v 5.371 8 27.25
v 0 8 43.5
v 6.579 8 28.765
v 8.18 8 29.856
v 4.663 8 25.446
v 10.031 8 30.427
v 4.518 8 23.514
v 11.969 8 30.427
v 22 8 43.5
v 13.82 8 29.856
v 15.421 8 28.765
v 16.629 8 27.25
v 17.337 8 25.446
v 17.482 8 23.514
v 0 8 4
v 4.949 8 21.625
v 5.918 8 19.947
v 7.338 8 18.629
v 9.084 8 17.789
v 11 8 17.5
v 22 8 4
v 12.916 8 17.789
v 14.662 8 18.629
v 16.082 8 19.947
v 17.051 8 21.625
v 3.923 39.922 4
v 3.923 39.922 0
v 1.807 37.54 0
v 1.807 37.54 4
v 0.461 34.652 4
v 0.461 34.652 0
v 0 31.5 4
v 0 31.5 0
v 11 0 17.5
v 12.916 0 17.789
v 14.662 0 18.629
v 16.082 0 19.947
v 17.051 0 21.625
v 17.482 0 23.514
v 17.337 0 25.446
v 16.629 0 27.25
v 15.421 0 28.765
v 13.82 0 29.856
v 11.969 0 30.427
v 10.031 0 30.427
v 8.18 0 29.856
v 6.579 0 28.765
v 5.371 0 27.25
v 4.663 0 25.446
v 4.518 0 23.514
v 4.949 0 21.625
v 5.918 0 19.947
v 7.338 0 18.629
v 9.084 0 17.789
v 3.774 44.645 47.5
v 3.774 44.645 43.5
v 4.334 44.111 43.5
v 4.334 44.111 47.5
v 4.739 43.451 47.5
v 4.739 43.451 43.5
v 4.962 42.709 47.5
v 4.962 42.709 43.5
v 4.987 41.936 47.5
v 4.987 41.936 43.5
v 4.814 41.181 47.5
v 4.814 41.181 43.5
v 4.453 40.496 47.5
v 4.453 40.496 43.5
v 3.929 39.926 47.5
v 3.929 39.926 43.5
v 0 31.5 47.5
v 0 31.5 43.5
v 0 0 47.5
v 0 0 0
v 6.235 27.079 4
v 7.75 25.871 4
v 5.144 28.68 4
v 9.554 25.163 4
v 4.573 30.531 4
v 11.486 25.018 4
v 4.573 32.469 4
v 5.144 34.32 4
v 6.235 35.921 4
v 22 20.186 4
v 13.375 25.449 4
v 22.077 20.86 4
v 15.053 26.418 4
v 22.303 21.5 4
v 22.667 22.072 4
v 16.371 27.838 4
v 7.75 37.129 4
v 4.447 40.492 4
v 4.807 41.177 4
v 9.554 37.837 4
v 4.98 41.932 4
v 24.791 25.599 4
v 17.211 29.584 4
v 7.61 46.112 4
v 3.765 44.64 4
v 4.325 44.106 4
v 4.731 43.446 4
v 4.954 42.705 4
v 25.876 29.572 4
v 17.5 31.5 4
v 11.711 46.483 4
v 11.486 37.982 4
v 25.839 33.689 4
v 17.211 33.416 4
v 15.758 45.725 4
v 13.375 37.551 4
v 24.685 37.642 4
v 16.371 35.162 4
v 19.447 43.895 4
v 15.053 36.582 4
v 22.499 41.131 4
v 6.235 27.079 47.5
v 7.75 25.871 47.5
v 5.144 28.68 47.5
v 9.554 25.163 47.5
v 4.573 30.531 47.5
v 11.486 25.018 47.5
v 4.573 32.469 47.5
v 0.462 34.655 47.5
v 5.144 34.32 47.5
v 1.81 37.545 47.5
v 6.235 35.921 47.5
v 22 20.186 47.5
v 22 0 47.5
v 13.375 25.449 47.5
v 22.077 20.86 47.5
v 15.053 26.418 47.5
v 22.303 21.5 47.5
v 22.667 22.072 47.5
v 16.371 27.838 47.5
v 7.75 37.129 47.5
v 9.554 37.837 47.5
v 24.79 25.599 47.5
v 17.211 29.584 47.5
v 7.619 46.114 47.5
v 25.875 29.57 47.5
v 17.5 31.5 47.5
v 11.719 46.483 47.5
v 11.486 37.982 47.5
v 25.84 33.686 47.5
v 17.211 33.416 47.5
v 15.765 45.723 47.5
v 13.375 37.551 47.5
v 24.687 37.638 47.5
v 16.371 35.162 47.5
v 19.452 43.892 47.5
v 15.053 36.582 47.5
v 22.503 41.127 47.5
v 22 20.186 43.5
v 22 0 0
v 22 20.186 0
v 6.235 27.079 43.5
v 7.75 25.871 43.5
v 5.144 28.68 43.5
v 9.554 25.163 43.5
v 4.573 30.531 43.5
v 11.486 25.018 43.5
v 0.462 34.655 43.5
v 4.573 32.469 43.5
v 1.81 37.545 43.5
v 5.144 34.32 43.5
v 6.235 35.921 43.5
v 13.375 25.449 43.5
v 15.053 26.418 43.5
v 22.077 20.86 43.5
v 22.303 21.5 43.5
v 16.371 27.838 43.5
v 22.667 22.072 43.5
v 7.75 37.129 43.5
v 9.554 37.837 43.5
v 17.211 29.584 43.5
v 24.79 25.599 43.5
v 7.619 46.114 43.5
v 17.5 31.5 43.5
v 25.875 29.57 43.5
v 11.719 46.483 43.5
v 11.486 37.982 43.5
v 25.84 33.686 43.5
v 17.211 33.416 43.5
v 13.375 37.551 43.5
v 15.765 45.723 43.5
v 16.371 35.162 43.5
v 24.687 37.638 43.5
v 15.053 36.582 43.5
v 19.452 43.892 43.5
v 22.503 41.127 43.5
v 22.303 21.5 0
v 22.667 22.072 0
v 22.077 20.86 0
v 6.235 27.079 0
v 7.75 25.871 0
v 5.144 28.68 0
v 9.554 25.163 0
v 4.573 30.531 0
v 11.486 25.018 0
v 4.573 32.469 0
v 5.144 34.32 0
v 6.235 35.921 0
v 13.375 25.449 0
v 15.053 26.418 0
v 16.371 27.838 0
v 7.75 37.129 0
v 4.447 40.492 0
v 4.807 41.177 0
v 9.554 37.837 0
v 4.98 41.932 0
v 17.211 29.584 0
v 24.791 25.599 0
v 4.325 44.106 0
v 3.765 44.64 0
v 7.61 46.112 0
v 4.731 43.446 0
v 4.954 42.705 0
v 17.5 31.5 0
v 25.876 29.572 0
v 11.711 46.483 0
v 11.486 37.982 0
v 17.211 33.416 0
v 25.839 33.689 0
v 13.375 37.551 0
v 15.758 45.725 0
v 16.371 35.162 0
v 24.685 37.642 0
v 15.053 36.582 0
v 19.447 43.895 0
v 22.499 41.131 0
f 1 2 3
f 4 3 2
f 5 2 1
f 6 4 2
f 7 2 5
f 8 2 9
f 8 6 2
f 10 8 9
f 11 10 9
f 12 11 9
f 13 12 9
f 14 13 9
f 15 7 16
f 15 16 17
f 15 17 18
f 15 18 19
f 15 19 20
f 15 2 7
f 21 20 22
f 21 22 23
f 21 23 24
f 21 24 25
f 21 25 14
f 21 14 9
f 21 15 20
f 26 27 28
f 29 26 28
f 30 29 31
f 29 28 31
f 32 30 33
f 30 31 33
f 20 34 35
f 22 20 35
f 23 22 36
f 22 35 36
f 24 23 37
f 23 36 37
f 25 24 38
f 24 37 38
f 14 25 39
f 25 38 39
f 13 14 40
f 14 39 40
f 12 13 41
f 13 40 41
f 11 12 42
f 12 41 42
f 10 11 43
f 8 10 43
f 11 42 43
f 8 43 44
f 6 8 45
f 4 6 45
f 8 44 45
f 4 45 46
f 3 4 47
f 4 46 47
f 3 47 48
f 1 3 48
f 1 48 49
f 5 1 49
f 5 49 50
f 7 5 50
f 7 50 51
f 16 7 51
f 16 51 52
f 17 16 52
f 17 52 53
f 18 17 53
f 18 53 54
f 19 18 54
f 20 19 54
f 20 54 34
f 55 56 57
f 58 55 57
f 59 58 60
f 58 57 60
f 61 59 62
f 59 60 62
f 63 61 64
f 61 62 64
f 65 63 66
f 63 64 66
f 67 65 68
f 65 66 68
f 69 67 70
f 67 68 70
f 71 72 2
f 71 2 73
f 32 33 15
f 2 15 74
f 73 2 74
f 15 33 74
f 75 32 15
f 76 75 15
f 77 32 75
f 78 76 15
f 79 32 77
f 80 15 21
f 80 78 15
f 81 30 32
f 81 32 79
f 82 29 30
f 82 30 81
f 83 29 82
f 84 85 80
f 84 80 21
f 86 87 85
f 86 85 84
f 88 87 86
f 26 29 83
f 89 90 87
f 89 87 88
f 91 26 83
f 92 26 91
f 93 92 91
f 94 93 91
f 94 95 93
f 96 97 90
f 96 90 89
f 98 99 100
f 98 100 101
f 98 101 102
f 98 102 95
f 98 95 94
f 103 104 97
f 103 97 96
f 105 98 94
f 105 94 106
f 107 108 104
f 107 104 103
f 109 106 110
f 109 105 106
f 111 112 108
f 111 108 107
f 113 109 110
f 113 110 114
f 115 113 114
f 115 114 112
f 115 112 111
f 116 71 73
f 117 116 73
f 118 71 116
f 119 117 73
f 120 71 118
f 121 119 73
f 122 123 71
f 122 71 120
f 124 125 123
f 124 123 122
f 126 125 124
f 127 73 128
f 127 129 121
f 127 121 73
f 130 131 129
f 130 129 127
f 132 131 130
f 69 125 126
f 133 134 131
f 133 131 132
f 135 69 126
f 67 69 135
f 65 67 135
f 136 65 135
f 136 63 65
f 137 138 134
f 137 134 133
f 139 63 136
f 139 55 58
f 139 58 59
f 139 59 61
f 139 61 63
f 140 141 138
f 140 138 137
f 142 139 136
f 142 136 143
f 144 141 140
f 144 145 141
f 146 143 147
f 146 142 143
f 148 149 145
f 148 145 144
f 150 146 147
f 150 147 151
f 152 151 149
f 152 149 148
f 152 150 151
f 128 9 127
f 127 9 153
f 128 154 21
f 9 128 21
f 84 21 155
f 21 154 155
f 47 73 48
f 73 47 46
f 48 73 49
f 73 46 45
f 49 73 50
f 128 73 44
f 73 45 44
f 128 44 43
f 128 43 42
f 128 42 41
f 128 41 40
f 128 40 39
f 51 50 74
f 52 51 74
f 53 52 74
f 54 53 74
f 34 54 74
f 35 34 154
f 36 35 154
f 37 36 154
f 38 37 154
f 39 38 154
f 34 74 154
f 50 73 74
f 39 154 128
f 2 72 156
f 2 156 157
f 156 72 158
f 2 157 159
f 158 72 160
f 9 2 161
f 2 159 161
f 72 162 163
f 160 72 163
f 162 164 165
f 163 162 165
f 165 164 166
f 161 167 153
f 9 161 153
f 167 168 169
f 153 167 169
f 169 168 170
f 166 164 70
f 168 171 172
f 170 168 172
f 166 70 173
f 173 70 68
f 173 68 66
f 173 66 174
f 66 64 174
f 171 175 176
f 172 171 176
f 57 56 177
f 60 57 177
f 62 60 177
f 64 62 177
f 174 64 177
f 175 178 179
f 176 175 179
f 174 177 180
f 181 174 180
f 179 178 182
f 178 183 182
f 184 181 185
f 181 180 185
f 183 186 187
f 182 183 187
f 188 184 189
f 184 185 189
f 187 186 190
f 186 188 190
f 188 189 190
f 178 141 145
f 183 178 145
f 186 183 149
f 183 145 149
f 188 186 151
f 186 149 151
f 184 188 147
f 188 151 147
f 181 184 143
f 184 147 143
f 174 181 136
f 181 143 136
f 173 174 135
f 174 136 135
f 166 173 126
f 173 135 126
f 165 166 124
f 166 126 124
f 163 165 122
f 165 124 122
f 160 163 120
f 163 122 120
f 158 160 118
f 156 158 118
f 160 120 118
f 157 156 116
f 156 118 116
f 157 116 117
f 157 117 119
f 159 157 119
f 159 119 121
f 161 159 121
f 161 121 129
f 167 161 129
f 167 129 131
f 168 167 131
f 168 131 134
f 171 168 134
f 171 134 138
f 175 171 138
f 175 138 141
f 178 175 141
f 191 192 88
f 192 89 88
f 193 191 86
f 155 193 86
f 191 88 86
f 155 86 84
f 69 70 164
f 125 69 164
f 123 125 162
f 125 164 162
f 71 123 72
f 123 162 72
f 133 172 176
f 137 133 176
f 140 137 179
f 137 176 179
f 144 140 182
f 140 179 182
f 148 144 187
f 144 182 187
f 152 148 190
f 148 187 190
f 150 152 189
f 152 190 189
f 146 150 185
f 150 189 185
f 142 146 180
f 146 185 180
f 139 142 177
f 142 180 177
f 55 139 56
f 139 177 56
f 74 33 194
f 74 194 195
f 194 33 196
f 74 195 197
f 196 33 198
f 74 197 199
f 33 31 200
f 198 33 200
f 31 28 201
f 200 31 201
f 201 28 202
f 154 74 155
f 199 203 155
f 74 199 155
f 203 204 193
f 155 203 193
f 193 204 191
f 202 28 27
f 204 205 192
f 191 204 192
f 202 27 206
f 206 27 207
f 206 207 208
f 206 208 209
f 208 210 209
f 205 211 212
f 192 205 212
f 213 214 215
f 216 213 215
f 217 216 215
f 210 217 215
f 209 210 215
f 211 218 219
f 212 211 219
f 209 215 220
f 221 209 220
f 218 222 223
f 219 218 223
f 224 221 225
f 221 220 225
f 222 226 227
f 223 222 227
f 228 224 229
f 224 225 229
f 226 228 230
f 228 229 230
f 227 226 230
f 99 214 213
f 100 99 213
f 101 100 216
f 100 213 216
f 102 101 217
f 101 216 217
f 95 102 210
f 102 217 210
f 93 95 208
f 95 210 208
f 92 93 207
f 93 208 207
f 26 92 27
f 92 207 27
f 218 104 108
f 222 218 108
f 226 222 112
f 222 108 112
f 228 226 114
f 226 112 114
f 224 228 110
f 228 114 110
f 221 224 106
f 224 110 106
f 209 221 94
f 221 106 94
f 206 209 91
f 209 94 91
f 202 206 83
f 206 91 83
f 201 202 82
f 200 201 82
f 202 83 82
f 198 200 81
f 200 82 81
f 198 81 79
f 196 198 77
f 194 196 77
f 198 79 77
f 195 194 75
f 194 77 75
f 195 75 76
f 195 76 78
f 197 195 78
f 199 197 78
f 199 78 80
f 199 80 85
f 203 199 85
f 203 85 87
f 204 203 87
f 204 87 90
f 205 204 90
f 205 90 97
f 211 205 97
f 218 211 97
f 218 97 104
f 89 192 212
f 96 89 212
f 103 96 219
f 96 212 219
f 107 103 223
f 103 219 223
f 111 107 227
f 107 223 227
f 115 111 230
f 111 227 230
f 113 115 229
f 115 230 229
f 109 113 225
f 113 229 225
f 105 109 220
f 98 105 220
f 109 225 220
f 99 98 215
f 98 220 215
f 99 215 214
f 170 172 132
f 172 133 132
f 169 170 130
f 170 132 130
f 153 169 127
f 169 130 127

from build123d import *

# Parameters (mm, degrees)
BOSS_EXTRUDE1_DEPTH = 4
SKETCH2_W           = 22
SKETCH2_H           = 8
BOSS_EXTRUDE2_DEPTH = 39.5
BOSS_EXTRUDE3_DEPTH = 4
FILLET1_R           = 3
SKETCH4_R           = 6.5
CUT_EXTRUDE1_DEPTH  = 72.375766196
CUT_EXTRUDE2_REACH  = 73.376
SKETCH5_R           = 6.5


with BuildPart() as part:
    # Sketch1 → Boss-Extrude1 (new body)
    with BuildSketch(Plane.XY):
        with BuildLine():
            Line((0, 0), (22, 0))
            Line((22, 0), (22, 21.301960973))
            ThreePointArc((22, 21.301960973), (22.819670179, 40.735550707), (3.764629611, 44.63961245))
            ThreePointArc((3.764629611, 44.63961245), (4.991727504, 42.319183704), (3.923405192, 39.92150853))
            ThreePointArc((3.923405192, 39.92150853), (1.028978415, 36.145291009), (0, 31.5))
            Line((0, 31.5), (0, 0))
        make_face()
    extrude(amount=BOSS_EXTRUDE1_DEPTH)

    # Sketch2 → Boss-Extrude2 (add)
    with BuildSketch(Plane.XY.offset(4)):
        with Locations((11, 4)):
            Rectangle(SKETCH2_W, SKETCH2_H)
    extrude(amount=BOSS_EXTRUDE2_DEPTH)

    # Sketch3 → Boss-Extrude3 (add)
    with BuildSketch(Plane.XY.offset(43.5)):
        with BuildLine():
            Line((0, 0), (22, 0))
            Line((22, 0), (22, 21.301960973))
            ThreePointArc((22, 21.301960973), (22.822920693, 40.731389185), (3.773882637, 44.644703414))
            ThreePointArc((3.773882637, 44.644703414), (4.999346476, 42.323411278), (3.929336293, 39.926488874))
            ThreePointArc((3.929336293, 39.926488874), (1.030614343, 36.148800879), (0, 31.5))
            Line((0, 31.5), (0, 0))
        make_face()
    extrude(amount=BOSS_EXTRUDE3_DEPTH)

    # Fillet1
    fillet1_edges = [part.edges().sort_by_distance(p)[0] for p in [
        (22, 21.301960973, 2),
        (22, 21.301960973, 45.5),
    ]]
    fillet(fillet1_edges, radius=FILLET1_R)

    # Sketch4 → Cut-Extrude1 (cut, through all)
    with BuildSketch(Plane.XY.offset(47.5)):
        with Locations((11, 31.5)):
            Circle(SKETCH4_R)
    extrude(amount=-CUT_EXTRUDE1_DEPTH, mode=Mode.SUBTRACT)

    # Sketch5 → Cut-Extrude2 (cut, up to next)
    with BuildSketch(Plane(origin=(0, 0, 0), x_dir=(-1, 0, 0), z_dir=(0, -1, 0)), mode=Mode.PRIVATE) as cut_extrude2_sk1:
        with Locations(Location((-11, -24, 0), (0, 0, 90))):
            Circle(SKETCH5_R)
    cut_extrude2_tool1 = extrude(cut_extrude2_sk1.sketch, amount=-CUT_EXTRUDE2_REACH, mode=Mode.PRIVATE) & part.part
    add(cut_extrude2_tool1.solids().sort_by_distance((11, 0, 24))[0], mode=Mode.SUBTRACT)


solid = part.part
